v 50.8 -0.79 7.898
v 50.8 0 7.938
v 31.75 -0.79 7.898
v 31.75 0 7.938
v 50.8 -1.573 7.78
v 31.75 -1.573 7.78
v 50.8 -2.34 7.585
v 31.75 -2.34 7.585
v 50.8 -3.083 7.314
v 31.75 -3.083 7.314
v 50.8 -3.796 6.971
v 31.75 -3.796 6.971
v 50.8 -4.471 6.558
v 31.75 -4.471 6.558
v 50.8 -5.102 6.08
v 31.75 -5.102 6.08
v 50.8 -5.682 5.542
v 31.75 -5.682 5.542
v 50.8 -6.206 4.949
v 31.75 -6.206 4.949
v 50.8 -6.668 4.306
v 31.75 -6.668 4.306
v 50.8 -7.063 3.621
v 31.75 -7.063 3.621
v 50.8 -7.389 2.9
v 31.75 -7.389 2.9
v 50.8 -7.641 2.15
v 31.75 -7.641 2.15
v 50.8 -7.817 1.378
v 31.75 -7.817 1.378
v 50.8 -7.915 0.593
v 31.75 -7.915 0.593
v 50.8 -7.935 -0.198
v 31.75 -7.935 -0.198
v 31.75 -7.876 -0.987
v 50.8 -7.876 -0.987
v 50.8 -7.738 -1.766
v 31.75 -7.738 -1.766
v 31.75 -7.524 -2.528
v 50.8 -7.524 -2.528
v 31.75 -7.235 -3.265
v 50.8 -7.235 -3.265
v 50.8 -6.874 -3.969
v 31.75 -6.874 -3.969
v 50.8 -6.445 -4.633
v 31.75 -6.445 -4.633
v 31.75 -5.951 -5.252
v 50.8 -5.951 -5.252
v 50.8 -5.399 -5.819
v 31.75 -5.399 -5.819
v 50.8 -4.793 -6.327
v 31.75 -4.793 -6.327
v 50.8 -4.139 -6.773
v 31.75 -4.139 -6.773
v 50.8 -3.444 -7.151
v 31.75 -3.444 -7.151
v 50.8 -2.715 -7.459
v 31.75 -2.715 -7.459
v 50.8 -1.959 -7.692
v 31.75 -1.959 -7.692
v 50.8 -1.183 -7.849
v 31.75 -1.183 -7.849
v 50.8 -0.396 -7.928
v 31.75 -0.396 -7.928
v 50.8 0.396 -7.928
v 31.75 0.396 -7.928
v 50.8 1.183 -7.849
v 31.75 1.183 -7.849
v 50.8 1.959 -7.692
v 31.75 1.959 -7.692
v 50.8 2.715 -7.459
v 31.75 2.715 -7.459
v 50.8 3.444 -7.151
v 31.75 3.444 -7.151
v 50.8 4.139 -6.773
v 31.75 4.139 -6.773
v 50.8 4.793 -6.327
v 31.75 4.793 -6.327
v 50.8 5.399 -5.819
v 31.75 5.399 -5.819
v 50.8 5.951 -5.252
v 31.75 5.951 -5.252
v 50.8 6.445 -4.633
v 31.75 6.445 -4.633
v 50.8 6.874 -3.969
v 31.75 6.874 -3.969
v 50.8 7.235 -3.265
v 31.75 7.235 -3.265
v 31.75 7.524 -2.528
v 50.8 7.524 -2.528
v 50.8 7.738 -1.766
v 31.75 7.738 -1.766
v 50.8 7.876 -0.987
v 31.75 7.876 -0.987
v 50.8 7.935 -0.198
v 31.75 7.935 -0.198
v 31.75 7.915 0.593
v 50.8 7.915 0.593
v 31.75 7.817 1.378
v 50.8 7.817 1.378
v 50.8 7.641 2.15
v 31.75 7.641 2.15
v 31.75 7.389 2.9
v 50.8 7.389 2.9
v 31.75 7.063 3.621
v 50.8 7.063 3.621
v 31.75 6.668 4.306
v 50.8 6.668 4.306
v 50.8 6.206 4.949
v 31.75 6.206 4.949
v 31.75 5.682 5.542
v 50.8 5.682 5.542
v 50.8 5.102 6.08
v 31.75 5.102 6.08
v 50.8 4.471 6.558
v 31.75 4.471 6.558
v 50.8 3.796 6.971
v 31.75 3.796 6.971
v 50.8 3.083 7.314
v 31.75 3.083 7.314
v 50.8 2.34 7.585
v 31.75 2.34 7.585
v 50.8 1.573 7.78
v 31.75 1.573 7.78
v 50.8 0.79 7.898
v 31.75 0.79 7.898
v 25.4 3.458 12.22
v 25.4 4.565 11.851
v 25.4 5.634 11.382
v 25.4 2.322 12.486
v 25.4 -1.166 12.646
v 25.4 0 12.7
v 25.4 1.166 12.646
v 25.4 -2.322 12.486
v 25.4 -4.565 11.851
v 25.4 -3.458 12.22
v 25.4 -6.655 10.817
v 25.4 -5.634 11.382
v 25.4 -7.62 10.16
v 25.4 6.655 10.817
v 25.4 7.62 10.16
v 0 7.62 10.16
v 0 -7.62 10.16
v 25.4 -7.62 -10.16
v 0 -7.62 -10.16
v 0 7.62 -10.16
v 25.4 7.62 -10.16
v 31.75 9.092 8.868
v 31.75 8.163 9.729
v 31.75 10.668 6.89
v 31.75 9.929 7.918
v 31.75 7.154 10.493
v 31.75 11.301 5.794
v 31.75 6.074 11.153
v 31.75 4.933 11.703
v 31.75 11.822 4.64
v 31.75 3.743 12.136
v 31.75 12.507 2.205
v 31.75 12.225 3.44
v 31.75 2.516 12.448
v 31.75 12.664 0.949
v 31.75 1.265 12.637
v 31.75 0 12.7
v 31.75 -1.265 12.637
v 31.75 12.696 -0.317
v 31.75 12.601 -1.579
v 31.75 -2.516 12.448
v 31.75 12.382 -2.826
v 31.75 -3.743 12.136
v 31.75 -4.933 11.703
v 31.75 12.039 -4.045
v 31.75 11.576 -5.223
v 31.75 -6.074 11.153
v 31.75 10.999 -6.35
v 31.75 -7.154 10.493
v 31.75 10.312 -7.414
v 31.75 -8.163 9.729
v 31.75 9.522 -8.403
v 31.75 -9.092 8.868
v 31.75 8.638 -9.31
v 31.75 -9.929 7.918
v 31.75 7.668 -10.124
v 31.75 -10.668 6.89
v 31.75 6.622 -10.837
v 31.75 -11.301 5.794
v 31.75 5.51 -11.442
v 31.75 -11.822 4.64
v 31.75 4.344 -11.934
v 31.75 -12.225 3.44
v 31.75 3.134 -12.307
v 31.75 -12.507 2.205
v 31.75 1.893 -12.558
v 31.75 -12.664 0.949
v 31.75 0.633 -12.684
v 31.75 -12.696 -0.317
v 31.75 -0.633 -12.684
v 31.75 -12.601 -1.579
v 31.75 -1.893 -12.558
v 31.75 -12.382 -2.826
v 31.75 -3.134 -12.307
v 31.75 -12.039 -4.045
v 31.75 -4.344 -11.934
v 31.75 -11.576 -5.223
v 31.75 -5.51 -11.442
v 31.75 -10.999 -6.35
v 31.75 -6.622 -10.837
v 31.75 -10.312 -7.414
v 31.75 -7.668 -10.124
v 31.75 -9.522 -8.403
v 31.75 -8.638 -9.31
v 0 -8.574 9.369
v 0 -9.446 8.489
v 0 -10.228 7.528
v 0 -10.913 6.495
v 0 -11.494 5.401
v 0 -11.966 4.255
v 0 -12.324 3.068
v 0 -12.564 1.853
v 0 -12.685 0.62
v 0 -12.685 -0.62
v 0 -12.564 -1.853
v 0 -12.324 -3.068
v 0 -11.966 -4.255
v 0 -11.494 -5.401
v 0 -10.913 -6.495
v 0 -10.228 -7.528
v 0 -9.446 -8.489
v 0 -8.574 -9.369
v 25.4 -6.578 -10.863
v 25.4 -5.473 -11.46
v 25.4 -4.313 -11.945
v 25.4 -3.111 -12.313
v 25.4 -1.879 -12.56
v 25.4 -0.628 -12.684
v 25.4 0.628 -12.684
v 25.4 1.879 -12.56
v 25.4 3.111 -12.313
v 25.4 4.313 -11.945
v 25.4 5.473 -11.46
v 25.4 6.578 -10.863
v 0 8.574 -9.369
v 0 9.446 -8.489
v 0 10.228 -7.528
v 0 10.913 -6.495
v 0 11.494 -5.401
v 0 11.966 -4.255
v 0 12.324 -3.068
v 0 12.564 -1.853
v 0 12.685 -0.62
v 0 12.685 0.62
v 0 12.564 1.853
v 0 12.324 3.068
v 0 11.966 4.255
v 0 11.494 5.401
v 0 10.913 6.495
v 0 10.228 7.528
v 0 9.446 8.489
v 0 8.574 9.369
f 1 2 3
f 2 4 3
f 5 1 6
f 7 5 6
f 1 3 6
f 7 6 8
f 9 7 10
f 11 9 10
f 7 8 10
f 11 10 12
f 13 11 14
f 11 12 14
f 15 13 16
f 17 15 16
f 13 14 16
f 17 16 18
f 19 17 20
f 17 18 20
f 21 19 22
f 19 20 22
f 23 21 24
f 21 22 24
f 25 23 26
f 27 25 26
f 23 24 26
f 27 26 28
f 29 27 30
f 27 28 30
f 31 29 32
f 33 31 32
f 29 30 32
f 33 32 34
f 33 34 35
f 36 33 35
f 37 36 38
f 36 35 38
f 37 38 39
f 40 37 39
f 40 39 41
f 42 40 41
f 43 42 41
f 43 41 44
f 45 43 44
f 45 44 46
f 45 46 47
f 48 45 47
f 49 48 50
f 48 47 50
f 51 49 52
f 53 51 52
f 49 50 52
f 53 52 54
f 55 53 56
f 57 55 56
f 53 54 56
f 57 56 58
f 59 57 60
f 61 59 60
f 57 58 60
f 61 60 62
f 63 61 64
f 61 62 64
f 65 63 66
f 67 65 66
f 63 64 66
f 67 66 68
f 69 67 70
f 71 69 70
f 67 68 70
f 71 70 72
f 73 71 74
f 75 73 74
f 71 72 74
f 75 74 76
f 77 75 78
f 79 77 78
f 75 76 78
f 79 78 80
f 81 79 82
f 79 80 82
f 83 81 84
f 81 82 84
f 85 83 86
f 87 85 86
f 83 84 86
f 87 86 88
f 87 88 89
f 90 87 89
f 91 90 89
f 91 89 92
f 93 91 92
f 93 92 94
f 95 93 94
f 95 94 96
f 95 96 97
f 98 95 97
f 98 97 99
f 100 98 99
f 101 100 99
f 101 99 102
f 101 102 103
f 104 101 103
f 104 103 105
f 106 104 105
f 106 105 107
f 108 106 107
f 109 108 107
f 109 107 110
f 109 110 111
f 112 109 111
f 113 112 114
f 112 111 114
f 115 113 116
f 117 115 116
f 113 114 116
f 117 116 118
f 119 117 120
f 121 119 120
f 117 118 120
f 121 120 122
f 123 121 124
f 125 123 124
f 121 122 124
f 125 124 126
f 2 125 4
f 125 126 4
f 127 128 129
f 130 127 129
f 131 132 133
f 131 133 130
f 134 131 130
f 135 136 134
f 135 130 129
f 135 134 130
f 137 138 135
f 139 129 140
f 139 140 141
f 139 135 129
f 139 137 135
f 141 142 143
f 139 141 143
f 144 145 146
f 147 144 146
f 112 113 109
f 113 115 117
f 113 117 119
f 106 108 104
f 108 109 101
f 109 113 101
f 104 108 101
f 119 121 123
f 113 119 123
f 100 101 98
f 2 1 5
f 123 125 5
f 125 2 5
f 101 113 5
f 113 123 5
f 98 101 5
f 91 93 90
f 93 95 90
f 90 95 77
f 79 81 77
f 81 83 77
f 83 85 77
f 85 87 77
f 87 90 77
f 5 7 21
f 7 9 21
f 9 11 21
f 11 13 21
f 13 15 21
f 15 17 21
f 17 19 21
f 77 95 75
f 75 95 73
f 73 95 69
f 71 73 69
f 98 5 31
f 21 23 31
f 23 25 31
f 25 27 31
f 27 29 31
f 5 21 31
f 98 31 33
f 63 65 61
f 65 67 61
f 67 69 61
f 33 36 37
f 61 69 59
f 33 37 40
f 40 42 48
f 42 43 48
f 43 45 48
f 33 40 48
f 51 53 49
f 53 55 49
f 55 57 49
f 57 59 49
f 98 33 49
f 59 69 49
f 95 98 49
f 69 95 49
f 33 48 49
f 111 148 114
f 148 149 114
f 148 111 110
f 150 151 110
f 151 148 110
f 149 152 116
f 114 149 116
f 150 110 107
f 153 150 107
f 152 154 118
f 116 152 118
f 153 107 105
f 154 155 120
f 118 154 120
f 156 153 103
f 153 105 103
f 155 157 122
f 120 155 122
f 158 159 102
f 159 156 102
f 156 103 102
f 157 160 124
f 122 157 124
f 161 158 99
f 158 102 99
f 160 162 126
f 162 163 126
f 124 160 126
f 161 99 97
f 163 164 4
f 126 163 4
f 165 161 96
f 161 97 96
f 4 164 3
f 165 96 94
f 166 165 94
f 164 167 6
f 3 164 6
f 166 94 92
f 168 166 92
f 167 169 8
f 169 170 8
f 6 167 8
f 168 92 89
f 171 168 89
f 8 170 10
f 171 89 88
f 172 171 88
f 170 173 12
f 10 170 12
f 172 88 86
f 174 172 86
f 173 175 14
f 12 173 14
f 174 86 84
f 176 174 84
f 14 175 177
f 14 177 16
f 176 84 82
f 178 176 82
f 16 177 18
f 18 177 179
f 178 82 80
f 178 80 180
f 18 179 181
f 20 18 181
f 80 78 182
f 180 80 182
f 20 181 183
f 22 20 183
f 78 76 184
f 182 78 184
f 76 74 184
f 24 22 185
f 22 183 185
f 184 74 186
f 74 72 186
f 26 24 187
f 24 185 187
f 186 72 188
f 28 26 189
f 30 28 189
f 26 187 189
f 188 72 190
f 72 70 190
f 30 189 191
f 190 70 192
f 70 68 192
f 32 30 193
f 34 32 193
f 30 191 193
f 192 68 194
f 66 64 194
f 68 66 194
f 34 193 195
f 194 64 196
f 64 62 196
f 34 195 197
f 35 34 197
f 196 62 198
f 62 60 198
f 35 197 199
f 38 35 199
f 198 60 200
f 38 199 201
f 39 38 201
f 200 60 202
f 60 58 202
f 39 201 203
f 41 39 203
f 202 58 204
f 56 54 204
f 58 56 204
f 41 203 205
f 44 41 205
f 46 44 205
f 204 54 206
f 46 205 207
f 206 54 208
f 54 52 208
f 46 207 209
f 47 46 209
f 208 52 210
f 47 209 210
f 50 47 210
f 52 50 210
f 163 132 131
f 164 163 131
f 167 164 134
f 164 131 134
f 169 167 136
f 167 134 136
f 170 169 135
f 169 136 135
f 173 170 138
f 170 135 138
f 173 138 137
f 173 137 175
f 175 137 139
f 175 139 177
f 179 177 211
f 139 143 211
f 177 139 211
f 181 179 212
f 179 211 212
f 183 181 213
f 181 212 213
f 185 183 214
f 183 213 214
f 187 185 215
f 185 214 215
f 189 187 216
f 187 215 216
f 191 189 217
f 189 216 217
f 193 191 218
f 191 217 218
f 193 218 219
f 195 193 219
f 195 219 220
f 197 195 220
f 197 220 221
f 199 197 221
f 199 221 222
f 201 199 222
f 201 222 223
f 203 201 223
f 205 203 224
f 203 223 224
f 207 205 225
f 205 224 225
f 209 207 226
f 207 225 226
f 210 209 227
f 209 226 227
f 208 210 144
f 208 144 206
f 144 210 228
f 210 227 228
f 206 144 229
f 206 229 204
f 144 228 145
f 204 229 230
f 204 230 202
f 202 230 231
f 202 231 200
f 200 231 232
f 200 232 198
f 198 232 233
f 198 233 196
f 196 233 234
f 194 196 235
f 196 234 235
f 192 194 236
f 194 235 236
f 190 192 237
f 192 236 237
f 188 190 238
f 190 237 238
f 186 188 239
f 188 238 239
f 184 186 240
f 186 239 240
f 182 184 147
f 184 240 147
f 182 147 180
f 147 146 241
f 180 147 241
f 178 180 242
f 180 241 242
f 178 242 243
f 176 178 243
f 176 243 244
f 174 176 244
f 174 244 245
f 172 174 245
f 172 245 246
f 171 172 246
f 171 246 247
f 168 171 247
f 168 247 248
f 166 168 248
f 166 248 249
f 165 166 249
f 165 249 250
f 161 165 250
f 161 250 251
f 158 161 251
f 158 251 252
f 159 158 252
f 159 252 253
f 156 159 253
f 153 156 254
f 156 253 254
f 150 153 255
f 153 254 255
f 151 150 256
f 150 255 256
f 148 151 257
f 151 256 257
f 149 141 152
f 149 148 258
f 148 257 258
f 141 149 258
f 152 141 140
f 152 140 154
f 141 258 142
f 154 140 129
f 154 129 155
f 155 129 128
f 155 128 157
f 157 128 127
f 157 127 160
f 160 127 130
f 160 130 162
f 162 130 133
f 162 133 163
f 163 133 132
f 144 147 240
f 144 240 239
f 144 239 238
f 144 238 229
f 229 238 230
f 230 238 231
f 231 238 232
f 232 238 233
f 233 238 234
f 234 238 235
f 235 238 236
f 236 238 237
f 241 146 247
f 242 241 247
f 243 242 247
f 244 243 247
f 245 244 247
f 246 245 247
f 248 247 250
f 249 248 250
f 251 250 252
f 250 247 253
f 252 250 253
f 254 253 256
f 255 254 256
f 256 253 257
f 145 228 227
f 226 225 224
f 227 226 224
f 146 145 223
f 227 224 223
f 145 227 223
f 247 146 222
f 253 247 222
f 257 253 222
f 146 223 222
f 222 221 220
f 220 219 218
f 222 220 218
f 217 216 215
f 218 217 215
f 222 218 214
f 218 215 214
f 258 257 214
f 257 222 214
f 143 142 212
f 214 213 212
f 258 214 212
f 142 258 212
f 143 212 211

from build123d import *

# Parameters (mm, degrees)
F3_DEPTH = 25.4


with BuildPart() as f1:
    # F0 (on Front) → F1 (revolve)
    with BuildSketch(Plane.XZ):
        Polygon((31.75, 12.7), (0, 12.7), (0, 0), (50.8, 0), (50.8, 7.9375), (31.75, 7.9375), align=None)
    revolve(axis=Axis((24.74322, 0, 0), (1, 0, 0)))

    # F2 (on face) → F3 (cut)
    with BuildSketch(Plane(origin=(0, 0, 0), x_dir=(0, -1, 0), z_dir=(-1, 0, 0))):
        with BuildLine():
            ThreePointArc((7.62, 10.16), (0, 12.7), (-7.62, 10.16))
            Line((-7.62, 10.16), (7.62, 10.16))
        make_face()
        with BuildLine():
            Line((7.62, -10.16), (-7.62, -10.16))
            ThreePointArc((-7.62, -10.16), (0, -12.7), (7.62, -10.16))
        make_face()
    extrude(amount=-F3_DEPTH, mode=Mode.SUBTRACT)


solid = f1.part
